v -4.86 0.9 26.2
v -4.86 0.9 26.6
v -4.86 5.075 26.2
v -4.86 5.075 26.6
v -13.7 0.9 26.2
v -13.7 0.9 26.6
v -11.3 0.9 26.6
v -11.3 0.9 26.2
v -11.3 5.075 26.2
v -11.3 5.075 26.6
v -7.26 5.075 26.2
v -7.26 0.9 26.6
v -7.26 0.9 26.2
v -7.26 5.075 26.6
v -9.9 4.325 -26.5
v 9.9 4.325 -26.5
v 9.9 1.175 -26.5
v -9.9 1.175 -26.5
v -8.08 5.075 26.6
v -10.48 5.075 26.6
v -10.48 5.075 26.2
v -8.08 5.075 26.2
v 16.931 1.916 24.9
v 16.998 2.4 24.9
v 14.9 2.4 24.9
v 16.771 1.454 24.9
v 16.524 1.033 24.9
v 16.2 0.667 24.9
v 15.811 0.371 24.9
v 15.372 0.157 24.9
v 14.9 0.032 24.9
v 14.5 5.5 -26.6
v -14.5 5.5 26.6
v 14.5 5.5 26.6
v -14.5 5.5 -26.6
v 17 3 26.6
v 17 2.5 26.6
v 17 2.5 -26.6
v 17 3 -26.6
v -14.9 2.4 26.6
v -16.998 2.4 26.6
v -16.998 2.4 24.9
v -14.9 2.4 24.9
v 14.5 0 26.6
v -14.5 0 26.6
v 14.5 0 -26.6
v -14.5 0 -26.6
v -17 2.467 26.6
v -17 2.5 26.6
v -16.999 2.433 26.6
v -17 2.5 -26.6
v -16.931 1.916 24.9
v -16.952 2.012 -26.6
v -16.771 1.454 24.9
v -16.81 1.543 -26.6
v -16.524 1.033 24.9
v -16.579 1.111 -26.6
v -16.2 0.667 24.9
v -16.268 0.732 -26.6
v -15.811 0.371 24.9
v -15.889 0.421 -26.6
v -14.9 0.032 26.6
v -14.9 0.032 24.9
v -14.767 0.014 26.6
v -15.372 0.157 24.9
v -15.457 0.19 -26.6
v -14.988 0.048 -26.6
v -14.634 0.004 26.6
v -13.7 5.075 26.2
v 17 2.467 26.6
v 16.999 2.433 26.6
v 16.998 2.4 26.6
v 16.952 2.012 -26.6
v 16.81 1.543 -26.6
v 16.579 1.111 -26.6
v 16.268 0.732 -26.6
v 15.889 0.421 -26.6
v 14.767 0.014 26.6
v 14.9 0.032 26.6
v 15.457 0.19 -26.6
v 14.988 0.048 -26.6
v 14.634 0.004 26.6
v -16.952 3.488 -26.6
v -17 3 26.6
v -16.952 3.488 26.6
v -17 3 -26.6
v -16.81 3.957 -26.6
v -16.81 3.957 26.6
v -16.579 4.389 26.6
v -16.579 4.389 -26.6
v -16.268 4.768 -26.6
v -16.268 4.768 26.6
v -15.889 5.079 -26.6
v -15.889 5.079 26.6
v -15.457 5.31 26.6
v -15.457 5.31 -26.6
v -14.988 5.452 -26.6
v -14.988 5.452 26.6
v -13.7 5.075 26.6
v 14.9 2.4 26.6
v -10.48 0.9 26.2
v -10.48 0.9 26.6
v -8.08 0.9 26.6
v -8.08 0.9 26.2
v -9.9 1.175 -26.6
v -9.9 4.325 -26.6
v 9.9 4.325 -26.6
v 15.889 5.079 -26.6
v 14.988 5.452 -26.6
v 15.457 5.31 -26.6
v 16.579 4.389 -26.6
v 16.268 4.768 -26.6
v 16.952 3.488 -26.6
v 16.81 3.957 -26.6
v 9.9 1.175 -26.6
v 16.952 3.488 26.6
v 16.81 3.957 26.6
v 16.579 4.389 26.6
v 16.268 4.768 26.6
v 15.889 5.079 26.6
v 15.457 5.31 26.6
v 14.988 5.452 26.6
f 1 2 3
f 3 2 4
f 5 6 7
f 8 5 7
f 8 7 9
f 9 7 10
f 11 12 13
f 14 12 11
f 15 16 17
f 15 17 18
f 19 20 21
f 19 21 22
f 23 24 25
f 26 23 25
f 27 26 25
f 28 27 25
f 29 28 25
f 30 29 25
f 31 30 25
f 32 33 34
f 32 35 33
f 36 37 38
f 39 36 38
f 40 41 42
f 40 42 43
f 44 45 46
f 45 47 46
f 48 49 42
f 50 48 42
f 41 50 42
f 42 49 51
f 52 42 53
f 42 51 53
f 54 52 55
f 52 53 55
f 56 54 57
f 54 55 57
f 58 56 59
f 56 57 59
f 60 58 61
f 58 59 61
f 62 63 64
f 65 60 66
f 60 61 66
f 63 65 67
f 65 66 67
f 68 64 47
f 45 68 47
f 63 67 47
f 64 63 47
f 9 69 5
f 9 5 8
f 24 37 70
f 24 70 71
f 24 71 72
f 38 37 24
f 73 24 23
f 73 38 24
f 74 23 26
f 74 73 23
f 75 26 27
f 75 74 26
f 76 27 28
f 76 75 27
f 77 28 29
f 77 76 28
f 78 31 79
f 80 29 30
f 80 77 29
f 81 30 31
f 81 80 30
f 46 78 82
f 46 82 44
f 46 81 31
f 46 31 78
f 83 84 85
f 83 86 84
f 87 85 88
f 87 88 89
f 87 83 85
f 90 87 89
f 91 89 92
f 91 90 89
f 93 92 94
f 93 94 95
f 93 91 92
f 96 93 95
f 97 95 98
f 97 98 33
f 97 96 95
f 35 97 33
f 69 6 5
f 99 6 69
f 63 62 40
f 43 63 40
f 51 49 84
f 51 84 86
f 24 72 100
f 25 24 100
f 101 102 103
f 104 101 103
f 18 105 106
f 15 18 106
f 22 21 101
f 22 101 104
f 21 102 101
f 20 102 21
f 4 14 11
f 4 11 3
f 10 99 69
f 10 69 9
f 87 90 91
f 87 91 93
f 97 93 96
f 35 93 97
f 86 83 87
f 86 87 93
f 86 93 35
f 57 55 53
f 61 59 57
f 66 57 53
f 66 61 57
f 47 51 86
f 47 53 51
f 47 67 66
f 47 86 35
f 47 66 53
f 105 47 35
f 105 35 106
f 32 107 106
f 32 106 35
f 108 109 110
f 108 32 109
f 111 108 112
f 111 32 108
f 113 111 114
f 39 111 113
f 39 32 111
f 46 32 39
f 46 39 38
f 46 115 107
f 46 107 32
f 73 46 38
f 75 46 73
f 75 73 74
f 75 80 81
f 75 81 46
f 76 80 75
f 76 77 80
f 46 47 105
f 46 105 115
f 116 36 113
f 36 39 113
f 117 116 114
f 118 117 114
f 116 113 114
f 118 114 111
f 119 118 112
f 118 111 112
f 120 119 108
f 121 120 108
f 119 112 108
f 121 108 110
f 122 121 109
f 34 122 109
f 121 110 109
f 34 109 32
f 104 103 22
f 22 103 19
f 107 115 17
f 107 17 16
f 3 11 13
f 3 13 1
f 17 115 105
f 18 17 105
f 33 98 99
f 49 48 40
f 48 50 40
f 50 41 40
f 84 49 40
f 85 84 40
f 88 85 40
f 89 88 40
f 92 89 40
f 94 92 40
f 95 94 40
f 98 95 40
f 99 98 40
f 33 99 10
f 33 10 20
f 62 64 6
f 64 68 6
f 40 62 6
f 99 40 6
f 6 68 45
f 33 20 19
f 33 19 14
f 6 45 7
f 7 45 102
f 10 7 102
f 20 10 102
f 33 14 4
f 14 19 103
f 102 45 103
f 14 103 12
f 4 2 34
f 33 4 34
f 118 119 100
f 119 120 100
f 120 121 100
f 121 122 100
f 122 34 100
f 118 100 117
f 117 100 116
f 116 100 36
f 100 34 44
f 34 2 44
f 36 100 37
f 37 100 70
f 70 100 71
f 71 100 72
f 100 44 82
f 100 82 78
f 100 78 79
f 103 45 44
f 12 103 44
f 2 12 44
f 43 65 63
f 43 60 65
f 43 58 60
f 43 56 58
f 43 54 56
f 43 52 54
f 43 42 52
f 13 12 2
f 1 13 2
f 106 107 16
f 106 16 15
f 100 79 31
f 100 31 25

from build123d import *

# Parameters (mm, degrees)
SKETCH1_W           = 34
SKETCH1_H           = 53.2
BOSS_EXTRUDE1_DEPTH = 5.5
FILLET1_R           = 2.5
SKETCH2_W           = 2.4
SKETCH2_H           = 4.175
CUT_EXTRUDE1_DEPTH  = 0.4
LPATTERN1_COUNT     = 3
LPATTERN1_PITCH     = 3.22
SKETCH4_W           = 4.132195005
SKETCH4_H           = 2.4
CUT_EXTRUDE2_DEPTH  = 1.7
SKETCH5_W           = 19.8
SKETCH5_H           = 3.15
CUT_EXTRUDE3_DEPTH  = 0.1


with BuildPart() as part:
    # Sketch1 → Boss-Extrude1 (new body)
    with BuildSketch(Plane(origin=(0, 0, 0), x_dir=(1, 0, 0), z_dir=(0, 1, 0))):
        Rectangle(SKETCH1_W, SKETCH1_H)
    extrude(amount=BOSS_EXTRUDE1_DEPTH)

    # Fillet1
    fillet1_edges = [part.edges().sort_by_distance(p)[0] for p in [
        (-17, 5.5, 0),
        (17, 5.5, 0),
        (-17, 0, 0),
        (17, 0, 0),
    ]]
    fillet(fillet1_edges, radius=FILLET1_R)

    # Sketch2 → Cut-Extrude1 (cut)
    with BuildSketch(Plane.XY.offset(26.6)):
        with Locations((-12.5, 2.9875)):
            Rectangle(SKETCH2_W, SKETCH2_H)
    cut_extrude1 = extrude(amount=-CUT_EXTRUDE1_DEPTH, mode=Mode.SUBTRACT)

    # LPattern1: Cut-Extrude1 ×3
    with Locations(*[(i * LPATTERN1_PITCH, 0, 0) for i in range(1, LPATTERN1_COUNT)]):
        add(cut_extrude1, mode=Mode.SUBTRACT)

    # Sketch4 → Cut-Extrude2 (cut)
    with BuildSketch(Plane.XY.offset(26.6)):
        with Locations((-16.966097503, 1.2)):
            Rectangle(SKETCH4_W, SKETCH4_H)
    cut_extrude2 = extrude(amount=-CUT_EXTRUDE2_DEPTH, mode=Mode.SUBTRACT)

    # Mirror1: Cut-Extrude2 across plane
    add(cut_extrude2.mirror(Plane(origin=(0, 0, 0), x_dir=(0, 0, 1), z_dir=(1, 0, 0))), mode=Mode.SUBTRACT)

    # Sketch5 → Cut-Extrude3 (cut)
    with BuildSketch(Plane(origin=(0, 0, -26.6), x_dir=(-1, 0, 0), z_dir=(0, 0, -1))):
        with Locations((0, 2.75)):
            Rectangle(SKETCH5_W, SKETCH5_H)
    extrude(amount=-CUT_EXTRUDE3_DEPTH, mode=Mode.SUBTRACT)


solid = part.part
